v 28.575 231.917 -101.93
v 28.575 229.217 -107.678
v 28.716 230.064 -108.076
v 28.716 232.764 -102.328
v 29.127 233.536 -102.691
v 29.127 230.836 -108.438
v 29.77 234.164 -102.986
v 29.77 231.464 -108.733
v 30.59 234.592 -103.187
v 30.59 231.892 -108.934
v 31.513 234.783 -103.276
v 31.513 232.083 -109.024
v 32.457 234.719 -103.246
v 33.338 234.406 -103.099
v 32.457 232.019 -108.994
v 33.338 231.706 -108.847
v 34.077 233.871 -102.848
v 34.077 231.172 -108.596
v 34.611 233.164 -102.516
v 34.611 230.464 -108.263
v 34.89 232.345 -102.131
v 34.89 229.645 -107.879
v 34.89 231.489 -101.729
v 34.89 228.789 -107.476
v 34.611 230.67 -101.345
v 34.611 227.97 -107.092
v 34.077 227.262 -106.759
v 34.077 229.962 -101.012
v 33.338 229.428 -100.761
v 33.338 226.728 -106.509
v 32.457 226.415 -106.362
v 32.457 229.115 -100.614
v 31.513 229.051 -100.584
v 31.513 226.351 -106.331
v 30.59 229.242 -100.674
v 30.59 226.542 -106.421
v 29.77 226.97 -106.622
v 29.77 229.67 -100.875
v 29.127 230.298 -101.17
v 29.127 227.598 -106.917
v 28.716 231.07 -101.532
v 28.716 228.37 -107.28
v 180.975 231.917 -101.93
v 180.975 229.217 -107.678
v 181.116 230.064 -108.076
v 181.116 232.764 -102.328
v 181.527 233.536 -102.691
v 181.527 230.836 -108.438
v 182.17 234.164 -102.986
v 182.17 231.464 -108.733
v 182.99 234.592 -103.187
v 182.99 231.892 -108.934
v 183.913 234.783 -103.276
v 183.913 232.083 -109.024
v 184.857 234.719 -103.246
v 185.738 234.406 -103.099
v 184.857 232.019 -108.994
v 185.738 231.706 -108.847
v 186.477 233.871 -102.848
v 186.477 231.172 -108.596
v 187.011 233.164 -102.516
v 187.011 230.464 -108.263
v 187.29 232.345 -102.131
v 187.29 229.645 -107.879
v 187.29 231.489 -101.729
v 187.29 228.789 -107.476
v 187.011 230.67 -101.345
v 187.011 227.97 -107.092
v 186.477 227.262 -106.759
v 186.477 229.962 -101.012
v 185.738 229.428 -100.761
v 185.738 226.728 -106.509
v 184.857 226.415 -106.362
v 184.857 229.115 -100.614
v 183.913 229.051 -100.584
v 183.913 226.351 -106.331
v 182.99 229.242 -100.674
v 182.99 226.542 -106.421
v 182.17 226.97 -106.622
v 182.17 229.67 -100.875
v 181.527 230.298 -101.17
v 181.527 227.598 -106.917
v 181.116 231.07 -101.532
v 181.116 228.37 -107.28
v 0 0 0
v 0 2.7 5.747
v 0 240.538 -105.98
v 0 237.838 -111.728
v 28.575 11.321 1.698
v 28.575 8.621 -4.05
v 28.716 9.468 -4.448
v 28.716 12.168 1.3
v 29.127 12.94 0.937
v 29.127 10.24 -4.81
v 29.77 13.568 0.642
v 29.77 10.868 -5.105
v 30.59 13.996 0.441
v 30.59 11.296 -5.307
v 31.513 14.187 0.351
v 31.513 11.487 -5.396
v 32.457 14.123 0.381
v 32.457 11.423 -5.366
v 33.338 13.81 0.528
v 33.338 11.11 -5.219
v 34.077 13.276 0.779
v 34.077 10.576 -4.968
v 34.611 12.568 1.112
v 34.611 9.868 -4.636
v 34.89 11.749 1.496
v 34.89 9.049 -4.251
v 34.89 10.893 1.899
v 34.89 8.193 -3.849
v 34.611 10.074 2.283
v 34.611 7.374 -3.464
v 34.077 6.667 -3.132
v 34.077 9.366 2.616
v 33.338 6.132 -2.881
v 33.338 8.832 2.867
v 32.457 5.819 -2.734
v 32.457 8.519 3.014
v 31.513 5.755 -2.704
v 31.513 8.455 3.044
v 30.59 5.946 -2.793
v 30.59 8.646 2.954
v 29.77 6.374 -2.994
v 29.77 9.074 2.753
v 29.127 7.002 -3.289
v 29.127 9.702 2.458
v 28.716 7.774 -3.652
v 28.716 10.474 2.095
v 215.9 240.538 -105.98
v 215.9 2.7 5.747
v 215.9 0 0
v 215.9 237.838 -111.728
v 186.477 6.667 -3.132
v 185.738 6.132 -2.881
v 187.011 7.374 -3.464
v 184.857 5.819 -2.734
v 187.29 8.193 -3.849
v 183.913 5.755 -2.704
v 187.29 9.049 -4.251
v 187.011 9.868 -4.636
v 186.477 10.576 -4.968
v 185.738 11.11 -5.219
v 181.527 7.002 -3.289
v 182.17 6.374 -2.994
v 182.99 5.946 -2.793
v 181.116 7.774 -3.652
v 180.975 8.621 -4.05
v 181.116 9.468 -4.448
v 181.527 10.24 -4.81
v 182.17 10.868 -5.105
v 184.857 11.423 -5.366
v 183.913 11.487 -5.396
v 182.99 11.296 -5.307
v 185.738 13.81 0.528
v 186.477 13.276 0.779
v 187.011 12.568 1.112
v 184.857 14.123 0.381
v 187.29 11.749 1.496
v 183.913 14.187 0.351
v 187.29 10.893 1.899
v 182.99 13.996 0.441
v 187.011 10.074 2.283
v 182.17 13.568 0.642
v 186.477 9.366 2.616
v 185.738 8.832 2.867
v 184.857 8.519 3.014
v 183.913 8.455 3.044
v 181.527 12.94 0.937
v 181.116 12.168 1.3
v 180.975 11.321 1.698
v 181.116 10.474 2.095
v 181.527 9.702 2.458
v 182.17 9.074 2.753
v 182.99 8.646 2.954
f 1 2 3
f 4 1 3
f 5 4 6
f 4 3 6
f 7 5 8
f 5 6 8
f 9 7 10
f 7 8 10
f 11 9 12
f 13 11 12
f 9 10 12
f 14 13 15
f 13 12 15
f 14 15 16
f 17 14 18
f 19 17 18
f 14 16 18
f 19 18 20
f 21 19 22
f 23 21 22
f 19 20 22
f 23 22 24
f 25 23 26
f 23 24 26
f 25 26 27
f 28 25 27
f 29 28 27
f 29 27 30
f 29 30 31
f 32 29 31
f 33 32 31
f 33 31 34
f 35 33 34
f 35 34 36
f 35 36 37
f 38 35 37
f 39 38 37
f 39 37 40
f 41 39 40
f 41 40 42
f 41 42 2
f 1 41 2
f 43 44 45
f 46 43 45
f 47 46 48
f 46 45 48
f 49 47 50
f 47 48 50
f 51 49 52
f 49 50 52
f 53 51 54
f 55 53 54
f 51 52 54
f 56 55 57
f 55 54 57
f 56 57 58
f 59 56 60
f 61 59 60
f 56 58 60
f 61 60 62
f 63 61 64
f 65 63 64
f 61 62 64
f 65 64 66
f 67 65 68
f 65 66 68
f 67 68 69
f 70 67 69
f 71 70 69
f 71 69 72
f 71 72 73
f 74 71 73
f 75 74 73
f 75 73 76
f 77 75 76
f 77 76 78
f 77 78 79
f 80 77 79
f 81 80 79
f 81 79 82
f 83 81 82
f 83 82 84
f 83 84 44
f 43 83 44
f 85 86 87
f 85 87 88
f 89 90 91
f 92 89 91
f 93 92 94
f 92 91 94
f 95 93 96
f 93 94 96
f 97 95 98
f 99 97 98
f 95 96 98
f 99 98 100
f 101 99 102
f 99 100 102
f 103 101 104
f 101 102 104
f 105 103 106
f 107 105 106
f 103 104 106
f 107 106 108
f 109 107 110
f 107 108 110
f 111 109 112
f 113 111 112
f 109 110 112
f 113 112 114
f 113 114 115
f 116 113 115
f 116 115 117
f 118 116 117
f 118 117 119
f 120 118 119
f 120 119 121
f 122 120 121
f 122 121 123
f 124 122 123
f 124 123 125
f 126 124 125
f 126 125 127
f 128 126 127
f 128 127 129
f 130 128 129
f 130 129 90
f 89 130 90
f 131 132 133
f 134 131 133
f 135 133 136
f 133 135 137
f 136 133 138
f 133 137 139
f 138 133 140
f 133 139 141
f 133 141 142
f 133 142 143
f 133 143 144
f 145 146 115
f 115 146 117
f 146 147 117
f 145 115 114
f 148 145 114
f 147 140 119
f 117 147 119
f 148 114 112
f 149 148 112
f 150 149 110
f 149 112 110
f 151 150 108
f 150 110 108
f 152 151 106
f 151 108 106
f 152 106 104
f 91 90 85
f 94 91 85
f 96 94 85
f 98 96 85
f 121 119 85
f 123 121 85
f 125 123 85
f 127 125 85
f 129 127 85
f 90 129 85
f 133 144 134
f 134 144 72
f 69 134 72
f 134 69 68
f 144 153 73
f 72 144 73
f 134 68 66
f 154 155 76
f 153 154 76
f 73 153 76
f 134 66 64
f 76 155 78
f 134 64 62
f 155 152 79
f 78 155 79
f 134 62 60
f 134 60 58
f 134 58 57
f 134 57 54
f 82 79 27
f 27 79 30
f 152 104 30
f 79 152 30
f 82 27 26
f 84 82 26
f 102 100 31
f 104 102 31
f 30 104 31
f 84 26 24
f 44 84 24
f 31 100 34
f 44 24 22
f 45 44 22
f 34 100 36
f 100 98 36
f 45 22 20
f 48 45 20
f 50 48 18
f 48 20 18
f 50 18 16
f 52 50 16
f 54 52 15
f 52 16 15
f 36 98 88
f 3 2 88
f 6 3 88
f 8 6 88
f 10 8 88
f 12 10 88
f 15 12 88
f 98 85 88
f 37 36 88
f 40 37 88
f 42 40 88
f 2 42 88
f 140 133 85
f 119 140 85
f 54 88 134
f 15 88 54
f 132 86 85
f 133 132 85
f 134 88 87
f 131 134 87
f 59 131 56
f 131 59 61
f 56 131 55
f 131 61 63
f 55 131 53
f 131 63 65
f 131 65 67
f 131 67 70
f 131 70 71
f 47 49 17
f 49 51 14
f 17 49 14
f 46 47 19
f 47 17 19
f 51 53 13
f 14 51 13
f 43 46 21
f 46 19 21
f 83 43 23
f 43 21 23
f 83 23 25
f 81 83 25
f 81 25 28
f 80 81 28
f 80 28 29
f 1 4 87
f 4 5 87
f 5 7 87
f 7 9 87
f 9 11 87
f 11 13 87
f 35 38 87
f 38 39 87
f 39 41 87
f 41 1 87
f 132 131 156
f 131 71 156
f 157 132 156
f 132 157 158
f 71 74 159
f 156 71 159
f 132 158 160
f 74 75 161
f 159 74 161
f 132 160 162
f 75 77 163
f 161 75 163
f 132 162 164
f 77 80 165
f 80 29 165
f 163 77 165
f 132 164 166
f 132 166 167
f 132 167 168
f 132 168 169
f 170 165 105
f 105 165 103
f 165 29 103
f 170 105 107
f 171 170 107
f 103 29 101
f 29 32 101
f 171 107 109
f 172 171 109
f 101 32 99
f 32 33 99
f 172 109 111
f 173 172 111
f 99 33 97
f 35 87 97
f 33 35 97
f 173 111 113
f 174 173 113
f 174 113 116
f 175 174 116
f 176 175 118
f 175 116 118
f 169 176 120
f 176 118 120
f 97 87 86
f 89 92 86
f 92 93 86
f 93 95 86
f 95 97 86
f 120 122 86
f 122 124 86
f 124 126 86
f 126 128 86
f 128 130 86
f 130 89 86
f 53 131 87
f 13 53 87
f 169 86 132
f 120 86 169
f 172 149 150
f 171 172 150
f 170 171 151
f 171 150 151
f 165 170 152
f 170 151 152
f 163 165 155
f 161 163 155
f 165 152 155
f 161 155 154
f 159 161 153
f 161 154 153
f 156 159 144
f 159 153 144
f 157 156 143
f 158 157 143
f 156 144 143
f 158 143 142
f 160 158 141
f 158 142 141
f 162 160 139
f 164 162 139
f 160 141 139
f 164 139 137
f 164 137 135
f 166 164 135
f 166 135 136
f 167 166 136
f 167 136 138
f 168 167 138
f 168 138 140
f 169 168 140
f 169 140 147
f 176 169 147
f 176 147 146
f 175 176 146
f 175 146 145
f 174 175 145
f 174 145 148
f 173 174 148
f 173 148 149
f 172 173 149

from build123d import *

# Parameters (mm, degrees)
BOSS_EXTRUDE1_DEPTH         = 215.9
F_1_4_0_25_DIAMETER_HOLE1_D = 6.35


with BuildPart() as part:
    # Sketch1 → Boss-Extrude1 (new body)
    with BuildSketch(Plane(origin=(0, 0, 0), x_dir=(0, 0, -1), z_dir=(1, 0, 0))):
        Polygon((0, 0), (111.727575693, 237.838071514), (105.980151385, 240.538), (-5.747424307, 2.699928486), align=None)
    extrude(amount=BOSS_EXTRUDE1_DEPTH)

    # 1/4 (0.25) Diameter Hole1 (through all)
    with Locations(Plane(origin=(0, 2.699928486, 5.747424307), x_dir=(1, 0, 0), z_dir=(0, 0.425185588, 0.90510619))):
        with Locations((31.75, 253.248665788), (184.15, 253.248665788), (184.15, 9.525), (31.75, 9.525)):
            Hole(F_1_4_0_25_DIAMETER_HOLE1_D / 2)


solid = part.part
